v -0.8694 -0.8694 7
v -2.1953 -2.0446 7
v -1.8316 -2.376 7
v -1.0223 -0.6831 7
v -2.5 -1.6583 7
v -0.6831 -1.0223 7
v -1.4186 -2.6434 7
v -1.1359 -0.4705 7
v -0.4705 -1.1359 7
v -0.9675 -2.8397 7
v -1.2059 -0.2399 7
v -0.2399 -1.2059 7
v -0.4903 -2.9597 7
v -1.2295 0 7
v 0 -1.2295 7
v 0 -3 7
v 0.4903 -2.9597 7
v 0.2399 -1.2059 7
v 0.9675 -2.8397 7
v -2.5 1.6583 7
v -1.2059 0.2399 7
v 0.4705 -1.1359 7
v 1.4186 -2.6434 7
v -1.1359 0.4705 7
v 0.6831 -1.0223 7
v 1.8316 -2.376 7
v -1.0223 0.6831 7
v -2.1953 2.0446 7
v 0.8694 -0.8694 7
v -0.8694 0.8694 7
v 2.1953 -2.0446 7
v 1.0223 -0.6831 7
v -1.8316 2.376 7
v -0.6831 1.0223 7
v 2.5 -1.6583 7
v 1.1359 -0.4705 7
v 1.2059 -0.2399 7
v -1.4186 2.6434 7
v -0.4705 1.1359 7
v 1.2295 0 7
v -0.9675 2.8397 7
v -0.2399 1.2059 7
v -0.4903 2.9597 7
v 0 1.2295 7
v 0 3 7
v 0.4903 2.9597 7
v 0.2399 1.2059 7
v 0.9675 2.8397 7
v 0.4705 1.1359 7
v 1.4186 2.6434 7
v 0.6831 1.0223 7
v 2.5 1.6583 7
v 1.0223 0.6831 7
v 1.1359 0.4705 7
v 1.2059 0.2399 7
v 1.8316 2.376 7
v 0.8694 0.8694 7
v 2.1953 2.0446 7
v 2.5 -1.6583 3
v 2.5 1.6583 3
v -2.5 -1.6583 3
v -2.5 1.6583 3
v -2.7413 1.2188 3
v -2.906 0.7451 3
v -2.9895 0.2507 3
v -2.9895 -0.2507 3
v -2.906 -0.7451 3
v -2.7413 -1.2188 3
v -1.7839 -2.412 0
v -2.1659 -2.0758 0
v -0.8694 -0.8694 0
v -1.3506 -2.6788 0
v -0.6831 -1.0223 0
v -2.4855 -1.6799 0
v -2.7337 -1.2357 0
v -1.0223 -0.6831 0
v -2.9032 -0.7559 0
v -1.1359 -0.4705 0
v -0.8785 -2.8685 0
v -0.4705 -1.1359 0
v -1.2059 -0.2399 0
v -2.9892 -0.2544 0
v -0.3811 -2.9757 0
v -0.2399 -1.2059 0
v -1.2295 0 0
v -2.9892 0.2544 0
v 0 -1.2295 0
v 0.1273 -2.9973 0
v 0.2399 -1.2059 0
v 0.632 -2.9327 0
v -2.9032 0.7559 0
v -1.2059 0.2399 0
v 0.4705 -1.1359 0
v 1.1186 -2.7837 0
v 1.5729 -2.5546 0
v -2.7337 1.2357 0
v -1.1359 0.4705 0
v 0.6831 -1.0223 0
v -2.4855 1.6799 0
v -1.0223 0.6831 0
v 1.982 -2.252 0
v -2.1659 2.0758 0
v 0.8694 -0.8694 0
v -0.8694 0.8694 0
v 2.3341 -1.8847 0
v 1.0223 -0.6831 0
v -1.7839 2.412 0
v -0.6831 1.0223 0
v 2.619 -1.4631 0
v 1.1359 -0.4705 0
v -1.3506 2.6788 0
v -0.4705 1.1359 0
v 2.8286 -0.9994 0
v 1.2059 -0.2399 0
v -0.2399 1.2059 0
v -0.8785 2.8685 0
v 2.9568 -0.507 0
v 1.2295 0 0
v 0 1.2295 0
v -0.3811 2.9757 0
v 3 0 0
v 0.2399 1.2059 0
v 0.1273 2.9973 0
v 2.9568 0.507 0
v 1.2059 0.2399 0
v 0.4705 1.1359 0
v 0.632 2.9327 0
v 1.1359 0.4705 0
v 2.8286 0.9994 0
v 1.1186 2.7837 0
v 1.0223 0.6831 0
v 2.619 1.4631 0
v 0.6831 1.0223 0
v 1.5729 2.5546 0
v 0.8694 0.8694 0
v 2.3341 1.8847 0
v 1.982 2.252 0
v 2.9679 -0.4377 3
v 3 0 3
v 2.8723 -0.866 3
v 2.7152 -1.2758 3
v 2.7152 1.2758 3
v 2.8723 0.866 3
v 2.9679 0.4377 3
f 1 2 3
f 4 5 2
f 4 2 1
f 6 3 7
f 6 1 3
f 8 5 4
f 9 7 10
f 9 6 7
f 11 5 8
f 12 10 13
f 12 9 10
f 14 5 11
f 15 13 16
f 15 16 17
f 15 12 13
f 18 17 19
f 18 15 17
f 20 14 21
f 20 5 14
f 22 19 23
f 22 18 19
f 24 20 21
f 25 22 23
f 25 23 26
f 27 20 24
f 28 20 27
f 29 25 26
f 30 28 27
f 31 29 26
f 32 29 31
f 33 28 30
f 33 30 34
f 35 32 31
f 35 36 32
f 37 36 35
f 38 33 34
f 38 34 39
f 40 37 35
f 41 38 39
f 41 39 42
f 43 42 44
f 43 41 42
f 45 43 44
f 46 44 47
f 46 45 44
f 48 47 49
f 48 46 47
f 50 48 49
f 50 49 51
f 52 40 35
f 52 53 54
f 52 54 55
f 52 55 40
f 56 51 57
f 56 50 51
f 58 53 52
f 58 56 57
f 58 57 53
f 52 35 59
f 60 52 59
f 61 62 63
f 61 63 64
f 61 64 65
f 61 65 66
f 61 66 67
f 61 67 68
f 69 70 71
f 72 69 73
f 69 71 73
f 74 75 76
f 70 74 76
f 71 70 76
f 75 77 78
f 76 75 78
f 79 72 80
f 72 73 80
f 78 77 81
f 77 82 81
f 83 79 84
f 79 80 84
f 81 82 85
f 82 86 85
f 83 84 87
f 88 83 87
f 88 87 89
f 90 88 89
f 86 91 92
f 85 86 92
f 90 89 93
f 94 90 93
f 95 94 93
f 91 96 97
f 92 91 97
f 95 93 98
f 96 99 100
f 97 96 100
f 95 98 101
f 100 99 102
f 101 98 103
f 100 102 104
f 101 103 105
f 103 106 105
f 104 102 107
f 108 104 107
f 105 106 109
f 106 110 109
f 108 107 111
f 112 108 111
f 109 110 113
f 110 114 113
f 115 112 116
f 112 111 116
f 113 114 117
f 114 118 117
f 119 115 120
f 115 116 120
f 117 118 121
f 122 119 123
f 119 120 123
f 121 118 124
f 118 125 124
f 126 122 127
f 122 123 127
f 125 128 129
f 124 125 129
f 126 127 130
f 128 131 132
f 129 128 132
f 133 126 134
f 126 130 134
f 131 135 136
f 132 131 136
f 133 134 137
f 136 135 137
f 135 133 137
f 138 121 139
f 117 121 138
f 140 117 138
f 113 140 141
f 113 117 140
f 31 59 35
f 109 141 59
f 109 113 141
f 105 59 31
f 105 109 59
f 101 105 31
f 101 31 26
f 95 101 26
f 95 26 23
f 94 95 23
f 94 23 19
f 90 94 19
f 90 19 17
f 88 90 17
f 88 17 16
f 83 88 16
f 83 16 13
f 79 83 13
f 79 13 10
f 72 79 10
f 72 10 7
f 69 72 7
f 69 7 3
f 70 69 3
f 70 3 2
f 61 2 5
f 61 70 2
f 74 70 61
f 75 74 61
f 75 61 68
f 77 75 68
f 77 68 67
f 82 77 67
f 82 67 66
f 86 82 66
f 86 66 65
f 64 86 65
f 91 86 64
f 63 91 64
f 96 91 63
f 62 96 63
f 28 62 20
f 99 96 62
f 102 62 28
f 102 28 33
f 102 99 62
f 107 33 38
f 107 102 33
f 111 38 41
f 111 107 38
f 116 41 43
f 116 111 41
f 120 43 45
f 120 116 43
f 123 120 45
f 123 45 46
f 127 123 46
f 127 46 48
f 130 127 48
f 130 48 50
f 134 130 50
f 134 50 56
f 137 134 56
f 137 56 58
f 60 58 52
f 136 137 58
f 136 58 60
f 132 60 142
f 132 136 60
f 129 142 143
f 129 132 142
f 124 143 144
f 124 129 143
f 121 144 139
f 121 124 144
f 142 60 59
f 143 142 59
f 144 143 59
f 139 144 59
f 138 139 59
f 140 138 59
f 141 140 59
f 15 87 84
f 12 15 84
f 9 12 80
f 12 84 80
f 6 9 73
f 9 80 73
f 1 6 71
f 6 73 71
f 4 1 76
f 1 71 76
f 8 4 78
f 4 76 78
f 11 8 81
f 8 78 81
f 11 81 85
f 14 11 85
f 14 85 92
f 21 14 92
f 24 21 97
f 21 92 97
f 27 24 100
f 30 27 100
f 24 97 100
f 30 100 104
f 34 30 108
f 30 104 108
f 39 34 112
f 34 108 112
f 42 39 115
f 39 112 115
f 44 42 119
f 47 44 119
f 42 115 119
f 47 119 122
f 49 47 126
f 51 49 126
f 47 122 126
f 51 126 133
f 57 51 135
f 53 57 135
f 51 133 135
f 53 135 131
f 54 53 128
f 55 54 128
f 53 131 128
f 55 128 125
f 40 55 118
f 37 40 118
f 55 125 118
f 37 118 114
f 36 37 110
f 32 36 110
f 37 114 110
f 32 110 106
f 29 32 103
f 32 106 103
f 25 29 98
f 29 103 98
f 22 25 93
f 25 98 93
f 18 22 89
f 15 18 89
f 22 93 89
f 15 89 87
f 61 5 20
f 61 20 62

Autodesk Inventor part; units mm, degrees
ref_plane "YZ Plane" through (0, 0, 0) normal (1, 0, 0) x (0, 1, 0)
ref_plane "XZ Plane" through (0, 0, 0) normal (0, 1, 0) x (-1, 0, 0)
ref_plane "XY Plane" through (0, 0, 0) normal (0, 0, 1) x (1, 0, 0)
sketch "Sketch1" plane through (0, 0, 0) normal (0, 0, 1) x (1, 0, 0)
  circle A0 centre (0, 0) radius 3
  dimension "d0" = 6
extrude "Extrusion1" add sketch "Sketch1" along normal blind 7
sketch "Sketch2" plane through (0, 0, 7) normal (0, 0, 1) x (1, 0, 0)
  point P0 (0, 0)
  point P1 (0, 0)
hole "Hole1" at (0, 0, 7) direction (0, 0, -1) diameter 2.459 end through all thread size "M3x0.5" class "6H" standard "ANSI Metric M Profile"
sketch "Sketch3" plane through (0, 0, 0) normal (0, 1, 0) x (-1, 0, 0)
  line L0 (3, 0) -> (3, 7) projected
  line L1 (3, 7) -> (2.5, 7)
  line L2 (2.5, 7) -> (2.5, 3)
  line L3 (2.5, 3) -> (3, 3)
  line L4 (3, 3) -> (3, 7)
  line L5 (3, 7) -> (-3, 7) projected
  line L6 (-3, 7) -> (-2.5, 7)
  line L7 (-2.5, 7) -> (-2.5, 3)
  line L8 (-2.5, 3) -> (-3, 3)
  line L9 (-3, 3) -> (-3, 7)
  point P0 (0, 0)
  dimension "d10" = 0.5
  dimension "d11" = 5
  dimension "d12" = 0.5
  dimension "d13" = 4
extrude "Extrusion2" cut sketch "Sketch3" along normal through all both and the other way through all
equation "\"d10\" = d12"
properties part number "Timing_Lever Weight" material "Aluminum 6061"
